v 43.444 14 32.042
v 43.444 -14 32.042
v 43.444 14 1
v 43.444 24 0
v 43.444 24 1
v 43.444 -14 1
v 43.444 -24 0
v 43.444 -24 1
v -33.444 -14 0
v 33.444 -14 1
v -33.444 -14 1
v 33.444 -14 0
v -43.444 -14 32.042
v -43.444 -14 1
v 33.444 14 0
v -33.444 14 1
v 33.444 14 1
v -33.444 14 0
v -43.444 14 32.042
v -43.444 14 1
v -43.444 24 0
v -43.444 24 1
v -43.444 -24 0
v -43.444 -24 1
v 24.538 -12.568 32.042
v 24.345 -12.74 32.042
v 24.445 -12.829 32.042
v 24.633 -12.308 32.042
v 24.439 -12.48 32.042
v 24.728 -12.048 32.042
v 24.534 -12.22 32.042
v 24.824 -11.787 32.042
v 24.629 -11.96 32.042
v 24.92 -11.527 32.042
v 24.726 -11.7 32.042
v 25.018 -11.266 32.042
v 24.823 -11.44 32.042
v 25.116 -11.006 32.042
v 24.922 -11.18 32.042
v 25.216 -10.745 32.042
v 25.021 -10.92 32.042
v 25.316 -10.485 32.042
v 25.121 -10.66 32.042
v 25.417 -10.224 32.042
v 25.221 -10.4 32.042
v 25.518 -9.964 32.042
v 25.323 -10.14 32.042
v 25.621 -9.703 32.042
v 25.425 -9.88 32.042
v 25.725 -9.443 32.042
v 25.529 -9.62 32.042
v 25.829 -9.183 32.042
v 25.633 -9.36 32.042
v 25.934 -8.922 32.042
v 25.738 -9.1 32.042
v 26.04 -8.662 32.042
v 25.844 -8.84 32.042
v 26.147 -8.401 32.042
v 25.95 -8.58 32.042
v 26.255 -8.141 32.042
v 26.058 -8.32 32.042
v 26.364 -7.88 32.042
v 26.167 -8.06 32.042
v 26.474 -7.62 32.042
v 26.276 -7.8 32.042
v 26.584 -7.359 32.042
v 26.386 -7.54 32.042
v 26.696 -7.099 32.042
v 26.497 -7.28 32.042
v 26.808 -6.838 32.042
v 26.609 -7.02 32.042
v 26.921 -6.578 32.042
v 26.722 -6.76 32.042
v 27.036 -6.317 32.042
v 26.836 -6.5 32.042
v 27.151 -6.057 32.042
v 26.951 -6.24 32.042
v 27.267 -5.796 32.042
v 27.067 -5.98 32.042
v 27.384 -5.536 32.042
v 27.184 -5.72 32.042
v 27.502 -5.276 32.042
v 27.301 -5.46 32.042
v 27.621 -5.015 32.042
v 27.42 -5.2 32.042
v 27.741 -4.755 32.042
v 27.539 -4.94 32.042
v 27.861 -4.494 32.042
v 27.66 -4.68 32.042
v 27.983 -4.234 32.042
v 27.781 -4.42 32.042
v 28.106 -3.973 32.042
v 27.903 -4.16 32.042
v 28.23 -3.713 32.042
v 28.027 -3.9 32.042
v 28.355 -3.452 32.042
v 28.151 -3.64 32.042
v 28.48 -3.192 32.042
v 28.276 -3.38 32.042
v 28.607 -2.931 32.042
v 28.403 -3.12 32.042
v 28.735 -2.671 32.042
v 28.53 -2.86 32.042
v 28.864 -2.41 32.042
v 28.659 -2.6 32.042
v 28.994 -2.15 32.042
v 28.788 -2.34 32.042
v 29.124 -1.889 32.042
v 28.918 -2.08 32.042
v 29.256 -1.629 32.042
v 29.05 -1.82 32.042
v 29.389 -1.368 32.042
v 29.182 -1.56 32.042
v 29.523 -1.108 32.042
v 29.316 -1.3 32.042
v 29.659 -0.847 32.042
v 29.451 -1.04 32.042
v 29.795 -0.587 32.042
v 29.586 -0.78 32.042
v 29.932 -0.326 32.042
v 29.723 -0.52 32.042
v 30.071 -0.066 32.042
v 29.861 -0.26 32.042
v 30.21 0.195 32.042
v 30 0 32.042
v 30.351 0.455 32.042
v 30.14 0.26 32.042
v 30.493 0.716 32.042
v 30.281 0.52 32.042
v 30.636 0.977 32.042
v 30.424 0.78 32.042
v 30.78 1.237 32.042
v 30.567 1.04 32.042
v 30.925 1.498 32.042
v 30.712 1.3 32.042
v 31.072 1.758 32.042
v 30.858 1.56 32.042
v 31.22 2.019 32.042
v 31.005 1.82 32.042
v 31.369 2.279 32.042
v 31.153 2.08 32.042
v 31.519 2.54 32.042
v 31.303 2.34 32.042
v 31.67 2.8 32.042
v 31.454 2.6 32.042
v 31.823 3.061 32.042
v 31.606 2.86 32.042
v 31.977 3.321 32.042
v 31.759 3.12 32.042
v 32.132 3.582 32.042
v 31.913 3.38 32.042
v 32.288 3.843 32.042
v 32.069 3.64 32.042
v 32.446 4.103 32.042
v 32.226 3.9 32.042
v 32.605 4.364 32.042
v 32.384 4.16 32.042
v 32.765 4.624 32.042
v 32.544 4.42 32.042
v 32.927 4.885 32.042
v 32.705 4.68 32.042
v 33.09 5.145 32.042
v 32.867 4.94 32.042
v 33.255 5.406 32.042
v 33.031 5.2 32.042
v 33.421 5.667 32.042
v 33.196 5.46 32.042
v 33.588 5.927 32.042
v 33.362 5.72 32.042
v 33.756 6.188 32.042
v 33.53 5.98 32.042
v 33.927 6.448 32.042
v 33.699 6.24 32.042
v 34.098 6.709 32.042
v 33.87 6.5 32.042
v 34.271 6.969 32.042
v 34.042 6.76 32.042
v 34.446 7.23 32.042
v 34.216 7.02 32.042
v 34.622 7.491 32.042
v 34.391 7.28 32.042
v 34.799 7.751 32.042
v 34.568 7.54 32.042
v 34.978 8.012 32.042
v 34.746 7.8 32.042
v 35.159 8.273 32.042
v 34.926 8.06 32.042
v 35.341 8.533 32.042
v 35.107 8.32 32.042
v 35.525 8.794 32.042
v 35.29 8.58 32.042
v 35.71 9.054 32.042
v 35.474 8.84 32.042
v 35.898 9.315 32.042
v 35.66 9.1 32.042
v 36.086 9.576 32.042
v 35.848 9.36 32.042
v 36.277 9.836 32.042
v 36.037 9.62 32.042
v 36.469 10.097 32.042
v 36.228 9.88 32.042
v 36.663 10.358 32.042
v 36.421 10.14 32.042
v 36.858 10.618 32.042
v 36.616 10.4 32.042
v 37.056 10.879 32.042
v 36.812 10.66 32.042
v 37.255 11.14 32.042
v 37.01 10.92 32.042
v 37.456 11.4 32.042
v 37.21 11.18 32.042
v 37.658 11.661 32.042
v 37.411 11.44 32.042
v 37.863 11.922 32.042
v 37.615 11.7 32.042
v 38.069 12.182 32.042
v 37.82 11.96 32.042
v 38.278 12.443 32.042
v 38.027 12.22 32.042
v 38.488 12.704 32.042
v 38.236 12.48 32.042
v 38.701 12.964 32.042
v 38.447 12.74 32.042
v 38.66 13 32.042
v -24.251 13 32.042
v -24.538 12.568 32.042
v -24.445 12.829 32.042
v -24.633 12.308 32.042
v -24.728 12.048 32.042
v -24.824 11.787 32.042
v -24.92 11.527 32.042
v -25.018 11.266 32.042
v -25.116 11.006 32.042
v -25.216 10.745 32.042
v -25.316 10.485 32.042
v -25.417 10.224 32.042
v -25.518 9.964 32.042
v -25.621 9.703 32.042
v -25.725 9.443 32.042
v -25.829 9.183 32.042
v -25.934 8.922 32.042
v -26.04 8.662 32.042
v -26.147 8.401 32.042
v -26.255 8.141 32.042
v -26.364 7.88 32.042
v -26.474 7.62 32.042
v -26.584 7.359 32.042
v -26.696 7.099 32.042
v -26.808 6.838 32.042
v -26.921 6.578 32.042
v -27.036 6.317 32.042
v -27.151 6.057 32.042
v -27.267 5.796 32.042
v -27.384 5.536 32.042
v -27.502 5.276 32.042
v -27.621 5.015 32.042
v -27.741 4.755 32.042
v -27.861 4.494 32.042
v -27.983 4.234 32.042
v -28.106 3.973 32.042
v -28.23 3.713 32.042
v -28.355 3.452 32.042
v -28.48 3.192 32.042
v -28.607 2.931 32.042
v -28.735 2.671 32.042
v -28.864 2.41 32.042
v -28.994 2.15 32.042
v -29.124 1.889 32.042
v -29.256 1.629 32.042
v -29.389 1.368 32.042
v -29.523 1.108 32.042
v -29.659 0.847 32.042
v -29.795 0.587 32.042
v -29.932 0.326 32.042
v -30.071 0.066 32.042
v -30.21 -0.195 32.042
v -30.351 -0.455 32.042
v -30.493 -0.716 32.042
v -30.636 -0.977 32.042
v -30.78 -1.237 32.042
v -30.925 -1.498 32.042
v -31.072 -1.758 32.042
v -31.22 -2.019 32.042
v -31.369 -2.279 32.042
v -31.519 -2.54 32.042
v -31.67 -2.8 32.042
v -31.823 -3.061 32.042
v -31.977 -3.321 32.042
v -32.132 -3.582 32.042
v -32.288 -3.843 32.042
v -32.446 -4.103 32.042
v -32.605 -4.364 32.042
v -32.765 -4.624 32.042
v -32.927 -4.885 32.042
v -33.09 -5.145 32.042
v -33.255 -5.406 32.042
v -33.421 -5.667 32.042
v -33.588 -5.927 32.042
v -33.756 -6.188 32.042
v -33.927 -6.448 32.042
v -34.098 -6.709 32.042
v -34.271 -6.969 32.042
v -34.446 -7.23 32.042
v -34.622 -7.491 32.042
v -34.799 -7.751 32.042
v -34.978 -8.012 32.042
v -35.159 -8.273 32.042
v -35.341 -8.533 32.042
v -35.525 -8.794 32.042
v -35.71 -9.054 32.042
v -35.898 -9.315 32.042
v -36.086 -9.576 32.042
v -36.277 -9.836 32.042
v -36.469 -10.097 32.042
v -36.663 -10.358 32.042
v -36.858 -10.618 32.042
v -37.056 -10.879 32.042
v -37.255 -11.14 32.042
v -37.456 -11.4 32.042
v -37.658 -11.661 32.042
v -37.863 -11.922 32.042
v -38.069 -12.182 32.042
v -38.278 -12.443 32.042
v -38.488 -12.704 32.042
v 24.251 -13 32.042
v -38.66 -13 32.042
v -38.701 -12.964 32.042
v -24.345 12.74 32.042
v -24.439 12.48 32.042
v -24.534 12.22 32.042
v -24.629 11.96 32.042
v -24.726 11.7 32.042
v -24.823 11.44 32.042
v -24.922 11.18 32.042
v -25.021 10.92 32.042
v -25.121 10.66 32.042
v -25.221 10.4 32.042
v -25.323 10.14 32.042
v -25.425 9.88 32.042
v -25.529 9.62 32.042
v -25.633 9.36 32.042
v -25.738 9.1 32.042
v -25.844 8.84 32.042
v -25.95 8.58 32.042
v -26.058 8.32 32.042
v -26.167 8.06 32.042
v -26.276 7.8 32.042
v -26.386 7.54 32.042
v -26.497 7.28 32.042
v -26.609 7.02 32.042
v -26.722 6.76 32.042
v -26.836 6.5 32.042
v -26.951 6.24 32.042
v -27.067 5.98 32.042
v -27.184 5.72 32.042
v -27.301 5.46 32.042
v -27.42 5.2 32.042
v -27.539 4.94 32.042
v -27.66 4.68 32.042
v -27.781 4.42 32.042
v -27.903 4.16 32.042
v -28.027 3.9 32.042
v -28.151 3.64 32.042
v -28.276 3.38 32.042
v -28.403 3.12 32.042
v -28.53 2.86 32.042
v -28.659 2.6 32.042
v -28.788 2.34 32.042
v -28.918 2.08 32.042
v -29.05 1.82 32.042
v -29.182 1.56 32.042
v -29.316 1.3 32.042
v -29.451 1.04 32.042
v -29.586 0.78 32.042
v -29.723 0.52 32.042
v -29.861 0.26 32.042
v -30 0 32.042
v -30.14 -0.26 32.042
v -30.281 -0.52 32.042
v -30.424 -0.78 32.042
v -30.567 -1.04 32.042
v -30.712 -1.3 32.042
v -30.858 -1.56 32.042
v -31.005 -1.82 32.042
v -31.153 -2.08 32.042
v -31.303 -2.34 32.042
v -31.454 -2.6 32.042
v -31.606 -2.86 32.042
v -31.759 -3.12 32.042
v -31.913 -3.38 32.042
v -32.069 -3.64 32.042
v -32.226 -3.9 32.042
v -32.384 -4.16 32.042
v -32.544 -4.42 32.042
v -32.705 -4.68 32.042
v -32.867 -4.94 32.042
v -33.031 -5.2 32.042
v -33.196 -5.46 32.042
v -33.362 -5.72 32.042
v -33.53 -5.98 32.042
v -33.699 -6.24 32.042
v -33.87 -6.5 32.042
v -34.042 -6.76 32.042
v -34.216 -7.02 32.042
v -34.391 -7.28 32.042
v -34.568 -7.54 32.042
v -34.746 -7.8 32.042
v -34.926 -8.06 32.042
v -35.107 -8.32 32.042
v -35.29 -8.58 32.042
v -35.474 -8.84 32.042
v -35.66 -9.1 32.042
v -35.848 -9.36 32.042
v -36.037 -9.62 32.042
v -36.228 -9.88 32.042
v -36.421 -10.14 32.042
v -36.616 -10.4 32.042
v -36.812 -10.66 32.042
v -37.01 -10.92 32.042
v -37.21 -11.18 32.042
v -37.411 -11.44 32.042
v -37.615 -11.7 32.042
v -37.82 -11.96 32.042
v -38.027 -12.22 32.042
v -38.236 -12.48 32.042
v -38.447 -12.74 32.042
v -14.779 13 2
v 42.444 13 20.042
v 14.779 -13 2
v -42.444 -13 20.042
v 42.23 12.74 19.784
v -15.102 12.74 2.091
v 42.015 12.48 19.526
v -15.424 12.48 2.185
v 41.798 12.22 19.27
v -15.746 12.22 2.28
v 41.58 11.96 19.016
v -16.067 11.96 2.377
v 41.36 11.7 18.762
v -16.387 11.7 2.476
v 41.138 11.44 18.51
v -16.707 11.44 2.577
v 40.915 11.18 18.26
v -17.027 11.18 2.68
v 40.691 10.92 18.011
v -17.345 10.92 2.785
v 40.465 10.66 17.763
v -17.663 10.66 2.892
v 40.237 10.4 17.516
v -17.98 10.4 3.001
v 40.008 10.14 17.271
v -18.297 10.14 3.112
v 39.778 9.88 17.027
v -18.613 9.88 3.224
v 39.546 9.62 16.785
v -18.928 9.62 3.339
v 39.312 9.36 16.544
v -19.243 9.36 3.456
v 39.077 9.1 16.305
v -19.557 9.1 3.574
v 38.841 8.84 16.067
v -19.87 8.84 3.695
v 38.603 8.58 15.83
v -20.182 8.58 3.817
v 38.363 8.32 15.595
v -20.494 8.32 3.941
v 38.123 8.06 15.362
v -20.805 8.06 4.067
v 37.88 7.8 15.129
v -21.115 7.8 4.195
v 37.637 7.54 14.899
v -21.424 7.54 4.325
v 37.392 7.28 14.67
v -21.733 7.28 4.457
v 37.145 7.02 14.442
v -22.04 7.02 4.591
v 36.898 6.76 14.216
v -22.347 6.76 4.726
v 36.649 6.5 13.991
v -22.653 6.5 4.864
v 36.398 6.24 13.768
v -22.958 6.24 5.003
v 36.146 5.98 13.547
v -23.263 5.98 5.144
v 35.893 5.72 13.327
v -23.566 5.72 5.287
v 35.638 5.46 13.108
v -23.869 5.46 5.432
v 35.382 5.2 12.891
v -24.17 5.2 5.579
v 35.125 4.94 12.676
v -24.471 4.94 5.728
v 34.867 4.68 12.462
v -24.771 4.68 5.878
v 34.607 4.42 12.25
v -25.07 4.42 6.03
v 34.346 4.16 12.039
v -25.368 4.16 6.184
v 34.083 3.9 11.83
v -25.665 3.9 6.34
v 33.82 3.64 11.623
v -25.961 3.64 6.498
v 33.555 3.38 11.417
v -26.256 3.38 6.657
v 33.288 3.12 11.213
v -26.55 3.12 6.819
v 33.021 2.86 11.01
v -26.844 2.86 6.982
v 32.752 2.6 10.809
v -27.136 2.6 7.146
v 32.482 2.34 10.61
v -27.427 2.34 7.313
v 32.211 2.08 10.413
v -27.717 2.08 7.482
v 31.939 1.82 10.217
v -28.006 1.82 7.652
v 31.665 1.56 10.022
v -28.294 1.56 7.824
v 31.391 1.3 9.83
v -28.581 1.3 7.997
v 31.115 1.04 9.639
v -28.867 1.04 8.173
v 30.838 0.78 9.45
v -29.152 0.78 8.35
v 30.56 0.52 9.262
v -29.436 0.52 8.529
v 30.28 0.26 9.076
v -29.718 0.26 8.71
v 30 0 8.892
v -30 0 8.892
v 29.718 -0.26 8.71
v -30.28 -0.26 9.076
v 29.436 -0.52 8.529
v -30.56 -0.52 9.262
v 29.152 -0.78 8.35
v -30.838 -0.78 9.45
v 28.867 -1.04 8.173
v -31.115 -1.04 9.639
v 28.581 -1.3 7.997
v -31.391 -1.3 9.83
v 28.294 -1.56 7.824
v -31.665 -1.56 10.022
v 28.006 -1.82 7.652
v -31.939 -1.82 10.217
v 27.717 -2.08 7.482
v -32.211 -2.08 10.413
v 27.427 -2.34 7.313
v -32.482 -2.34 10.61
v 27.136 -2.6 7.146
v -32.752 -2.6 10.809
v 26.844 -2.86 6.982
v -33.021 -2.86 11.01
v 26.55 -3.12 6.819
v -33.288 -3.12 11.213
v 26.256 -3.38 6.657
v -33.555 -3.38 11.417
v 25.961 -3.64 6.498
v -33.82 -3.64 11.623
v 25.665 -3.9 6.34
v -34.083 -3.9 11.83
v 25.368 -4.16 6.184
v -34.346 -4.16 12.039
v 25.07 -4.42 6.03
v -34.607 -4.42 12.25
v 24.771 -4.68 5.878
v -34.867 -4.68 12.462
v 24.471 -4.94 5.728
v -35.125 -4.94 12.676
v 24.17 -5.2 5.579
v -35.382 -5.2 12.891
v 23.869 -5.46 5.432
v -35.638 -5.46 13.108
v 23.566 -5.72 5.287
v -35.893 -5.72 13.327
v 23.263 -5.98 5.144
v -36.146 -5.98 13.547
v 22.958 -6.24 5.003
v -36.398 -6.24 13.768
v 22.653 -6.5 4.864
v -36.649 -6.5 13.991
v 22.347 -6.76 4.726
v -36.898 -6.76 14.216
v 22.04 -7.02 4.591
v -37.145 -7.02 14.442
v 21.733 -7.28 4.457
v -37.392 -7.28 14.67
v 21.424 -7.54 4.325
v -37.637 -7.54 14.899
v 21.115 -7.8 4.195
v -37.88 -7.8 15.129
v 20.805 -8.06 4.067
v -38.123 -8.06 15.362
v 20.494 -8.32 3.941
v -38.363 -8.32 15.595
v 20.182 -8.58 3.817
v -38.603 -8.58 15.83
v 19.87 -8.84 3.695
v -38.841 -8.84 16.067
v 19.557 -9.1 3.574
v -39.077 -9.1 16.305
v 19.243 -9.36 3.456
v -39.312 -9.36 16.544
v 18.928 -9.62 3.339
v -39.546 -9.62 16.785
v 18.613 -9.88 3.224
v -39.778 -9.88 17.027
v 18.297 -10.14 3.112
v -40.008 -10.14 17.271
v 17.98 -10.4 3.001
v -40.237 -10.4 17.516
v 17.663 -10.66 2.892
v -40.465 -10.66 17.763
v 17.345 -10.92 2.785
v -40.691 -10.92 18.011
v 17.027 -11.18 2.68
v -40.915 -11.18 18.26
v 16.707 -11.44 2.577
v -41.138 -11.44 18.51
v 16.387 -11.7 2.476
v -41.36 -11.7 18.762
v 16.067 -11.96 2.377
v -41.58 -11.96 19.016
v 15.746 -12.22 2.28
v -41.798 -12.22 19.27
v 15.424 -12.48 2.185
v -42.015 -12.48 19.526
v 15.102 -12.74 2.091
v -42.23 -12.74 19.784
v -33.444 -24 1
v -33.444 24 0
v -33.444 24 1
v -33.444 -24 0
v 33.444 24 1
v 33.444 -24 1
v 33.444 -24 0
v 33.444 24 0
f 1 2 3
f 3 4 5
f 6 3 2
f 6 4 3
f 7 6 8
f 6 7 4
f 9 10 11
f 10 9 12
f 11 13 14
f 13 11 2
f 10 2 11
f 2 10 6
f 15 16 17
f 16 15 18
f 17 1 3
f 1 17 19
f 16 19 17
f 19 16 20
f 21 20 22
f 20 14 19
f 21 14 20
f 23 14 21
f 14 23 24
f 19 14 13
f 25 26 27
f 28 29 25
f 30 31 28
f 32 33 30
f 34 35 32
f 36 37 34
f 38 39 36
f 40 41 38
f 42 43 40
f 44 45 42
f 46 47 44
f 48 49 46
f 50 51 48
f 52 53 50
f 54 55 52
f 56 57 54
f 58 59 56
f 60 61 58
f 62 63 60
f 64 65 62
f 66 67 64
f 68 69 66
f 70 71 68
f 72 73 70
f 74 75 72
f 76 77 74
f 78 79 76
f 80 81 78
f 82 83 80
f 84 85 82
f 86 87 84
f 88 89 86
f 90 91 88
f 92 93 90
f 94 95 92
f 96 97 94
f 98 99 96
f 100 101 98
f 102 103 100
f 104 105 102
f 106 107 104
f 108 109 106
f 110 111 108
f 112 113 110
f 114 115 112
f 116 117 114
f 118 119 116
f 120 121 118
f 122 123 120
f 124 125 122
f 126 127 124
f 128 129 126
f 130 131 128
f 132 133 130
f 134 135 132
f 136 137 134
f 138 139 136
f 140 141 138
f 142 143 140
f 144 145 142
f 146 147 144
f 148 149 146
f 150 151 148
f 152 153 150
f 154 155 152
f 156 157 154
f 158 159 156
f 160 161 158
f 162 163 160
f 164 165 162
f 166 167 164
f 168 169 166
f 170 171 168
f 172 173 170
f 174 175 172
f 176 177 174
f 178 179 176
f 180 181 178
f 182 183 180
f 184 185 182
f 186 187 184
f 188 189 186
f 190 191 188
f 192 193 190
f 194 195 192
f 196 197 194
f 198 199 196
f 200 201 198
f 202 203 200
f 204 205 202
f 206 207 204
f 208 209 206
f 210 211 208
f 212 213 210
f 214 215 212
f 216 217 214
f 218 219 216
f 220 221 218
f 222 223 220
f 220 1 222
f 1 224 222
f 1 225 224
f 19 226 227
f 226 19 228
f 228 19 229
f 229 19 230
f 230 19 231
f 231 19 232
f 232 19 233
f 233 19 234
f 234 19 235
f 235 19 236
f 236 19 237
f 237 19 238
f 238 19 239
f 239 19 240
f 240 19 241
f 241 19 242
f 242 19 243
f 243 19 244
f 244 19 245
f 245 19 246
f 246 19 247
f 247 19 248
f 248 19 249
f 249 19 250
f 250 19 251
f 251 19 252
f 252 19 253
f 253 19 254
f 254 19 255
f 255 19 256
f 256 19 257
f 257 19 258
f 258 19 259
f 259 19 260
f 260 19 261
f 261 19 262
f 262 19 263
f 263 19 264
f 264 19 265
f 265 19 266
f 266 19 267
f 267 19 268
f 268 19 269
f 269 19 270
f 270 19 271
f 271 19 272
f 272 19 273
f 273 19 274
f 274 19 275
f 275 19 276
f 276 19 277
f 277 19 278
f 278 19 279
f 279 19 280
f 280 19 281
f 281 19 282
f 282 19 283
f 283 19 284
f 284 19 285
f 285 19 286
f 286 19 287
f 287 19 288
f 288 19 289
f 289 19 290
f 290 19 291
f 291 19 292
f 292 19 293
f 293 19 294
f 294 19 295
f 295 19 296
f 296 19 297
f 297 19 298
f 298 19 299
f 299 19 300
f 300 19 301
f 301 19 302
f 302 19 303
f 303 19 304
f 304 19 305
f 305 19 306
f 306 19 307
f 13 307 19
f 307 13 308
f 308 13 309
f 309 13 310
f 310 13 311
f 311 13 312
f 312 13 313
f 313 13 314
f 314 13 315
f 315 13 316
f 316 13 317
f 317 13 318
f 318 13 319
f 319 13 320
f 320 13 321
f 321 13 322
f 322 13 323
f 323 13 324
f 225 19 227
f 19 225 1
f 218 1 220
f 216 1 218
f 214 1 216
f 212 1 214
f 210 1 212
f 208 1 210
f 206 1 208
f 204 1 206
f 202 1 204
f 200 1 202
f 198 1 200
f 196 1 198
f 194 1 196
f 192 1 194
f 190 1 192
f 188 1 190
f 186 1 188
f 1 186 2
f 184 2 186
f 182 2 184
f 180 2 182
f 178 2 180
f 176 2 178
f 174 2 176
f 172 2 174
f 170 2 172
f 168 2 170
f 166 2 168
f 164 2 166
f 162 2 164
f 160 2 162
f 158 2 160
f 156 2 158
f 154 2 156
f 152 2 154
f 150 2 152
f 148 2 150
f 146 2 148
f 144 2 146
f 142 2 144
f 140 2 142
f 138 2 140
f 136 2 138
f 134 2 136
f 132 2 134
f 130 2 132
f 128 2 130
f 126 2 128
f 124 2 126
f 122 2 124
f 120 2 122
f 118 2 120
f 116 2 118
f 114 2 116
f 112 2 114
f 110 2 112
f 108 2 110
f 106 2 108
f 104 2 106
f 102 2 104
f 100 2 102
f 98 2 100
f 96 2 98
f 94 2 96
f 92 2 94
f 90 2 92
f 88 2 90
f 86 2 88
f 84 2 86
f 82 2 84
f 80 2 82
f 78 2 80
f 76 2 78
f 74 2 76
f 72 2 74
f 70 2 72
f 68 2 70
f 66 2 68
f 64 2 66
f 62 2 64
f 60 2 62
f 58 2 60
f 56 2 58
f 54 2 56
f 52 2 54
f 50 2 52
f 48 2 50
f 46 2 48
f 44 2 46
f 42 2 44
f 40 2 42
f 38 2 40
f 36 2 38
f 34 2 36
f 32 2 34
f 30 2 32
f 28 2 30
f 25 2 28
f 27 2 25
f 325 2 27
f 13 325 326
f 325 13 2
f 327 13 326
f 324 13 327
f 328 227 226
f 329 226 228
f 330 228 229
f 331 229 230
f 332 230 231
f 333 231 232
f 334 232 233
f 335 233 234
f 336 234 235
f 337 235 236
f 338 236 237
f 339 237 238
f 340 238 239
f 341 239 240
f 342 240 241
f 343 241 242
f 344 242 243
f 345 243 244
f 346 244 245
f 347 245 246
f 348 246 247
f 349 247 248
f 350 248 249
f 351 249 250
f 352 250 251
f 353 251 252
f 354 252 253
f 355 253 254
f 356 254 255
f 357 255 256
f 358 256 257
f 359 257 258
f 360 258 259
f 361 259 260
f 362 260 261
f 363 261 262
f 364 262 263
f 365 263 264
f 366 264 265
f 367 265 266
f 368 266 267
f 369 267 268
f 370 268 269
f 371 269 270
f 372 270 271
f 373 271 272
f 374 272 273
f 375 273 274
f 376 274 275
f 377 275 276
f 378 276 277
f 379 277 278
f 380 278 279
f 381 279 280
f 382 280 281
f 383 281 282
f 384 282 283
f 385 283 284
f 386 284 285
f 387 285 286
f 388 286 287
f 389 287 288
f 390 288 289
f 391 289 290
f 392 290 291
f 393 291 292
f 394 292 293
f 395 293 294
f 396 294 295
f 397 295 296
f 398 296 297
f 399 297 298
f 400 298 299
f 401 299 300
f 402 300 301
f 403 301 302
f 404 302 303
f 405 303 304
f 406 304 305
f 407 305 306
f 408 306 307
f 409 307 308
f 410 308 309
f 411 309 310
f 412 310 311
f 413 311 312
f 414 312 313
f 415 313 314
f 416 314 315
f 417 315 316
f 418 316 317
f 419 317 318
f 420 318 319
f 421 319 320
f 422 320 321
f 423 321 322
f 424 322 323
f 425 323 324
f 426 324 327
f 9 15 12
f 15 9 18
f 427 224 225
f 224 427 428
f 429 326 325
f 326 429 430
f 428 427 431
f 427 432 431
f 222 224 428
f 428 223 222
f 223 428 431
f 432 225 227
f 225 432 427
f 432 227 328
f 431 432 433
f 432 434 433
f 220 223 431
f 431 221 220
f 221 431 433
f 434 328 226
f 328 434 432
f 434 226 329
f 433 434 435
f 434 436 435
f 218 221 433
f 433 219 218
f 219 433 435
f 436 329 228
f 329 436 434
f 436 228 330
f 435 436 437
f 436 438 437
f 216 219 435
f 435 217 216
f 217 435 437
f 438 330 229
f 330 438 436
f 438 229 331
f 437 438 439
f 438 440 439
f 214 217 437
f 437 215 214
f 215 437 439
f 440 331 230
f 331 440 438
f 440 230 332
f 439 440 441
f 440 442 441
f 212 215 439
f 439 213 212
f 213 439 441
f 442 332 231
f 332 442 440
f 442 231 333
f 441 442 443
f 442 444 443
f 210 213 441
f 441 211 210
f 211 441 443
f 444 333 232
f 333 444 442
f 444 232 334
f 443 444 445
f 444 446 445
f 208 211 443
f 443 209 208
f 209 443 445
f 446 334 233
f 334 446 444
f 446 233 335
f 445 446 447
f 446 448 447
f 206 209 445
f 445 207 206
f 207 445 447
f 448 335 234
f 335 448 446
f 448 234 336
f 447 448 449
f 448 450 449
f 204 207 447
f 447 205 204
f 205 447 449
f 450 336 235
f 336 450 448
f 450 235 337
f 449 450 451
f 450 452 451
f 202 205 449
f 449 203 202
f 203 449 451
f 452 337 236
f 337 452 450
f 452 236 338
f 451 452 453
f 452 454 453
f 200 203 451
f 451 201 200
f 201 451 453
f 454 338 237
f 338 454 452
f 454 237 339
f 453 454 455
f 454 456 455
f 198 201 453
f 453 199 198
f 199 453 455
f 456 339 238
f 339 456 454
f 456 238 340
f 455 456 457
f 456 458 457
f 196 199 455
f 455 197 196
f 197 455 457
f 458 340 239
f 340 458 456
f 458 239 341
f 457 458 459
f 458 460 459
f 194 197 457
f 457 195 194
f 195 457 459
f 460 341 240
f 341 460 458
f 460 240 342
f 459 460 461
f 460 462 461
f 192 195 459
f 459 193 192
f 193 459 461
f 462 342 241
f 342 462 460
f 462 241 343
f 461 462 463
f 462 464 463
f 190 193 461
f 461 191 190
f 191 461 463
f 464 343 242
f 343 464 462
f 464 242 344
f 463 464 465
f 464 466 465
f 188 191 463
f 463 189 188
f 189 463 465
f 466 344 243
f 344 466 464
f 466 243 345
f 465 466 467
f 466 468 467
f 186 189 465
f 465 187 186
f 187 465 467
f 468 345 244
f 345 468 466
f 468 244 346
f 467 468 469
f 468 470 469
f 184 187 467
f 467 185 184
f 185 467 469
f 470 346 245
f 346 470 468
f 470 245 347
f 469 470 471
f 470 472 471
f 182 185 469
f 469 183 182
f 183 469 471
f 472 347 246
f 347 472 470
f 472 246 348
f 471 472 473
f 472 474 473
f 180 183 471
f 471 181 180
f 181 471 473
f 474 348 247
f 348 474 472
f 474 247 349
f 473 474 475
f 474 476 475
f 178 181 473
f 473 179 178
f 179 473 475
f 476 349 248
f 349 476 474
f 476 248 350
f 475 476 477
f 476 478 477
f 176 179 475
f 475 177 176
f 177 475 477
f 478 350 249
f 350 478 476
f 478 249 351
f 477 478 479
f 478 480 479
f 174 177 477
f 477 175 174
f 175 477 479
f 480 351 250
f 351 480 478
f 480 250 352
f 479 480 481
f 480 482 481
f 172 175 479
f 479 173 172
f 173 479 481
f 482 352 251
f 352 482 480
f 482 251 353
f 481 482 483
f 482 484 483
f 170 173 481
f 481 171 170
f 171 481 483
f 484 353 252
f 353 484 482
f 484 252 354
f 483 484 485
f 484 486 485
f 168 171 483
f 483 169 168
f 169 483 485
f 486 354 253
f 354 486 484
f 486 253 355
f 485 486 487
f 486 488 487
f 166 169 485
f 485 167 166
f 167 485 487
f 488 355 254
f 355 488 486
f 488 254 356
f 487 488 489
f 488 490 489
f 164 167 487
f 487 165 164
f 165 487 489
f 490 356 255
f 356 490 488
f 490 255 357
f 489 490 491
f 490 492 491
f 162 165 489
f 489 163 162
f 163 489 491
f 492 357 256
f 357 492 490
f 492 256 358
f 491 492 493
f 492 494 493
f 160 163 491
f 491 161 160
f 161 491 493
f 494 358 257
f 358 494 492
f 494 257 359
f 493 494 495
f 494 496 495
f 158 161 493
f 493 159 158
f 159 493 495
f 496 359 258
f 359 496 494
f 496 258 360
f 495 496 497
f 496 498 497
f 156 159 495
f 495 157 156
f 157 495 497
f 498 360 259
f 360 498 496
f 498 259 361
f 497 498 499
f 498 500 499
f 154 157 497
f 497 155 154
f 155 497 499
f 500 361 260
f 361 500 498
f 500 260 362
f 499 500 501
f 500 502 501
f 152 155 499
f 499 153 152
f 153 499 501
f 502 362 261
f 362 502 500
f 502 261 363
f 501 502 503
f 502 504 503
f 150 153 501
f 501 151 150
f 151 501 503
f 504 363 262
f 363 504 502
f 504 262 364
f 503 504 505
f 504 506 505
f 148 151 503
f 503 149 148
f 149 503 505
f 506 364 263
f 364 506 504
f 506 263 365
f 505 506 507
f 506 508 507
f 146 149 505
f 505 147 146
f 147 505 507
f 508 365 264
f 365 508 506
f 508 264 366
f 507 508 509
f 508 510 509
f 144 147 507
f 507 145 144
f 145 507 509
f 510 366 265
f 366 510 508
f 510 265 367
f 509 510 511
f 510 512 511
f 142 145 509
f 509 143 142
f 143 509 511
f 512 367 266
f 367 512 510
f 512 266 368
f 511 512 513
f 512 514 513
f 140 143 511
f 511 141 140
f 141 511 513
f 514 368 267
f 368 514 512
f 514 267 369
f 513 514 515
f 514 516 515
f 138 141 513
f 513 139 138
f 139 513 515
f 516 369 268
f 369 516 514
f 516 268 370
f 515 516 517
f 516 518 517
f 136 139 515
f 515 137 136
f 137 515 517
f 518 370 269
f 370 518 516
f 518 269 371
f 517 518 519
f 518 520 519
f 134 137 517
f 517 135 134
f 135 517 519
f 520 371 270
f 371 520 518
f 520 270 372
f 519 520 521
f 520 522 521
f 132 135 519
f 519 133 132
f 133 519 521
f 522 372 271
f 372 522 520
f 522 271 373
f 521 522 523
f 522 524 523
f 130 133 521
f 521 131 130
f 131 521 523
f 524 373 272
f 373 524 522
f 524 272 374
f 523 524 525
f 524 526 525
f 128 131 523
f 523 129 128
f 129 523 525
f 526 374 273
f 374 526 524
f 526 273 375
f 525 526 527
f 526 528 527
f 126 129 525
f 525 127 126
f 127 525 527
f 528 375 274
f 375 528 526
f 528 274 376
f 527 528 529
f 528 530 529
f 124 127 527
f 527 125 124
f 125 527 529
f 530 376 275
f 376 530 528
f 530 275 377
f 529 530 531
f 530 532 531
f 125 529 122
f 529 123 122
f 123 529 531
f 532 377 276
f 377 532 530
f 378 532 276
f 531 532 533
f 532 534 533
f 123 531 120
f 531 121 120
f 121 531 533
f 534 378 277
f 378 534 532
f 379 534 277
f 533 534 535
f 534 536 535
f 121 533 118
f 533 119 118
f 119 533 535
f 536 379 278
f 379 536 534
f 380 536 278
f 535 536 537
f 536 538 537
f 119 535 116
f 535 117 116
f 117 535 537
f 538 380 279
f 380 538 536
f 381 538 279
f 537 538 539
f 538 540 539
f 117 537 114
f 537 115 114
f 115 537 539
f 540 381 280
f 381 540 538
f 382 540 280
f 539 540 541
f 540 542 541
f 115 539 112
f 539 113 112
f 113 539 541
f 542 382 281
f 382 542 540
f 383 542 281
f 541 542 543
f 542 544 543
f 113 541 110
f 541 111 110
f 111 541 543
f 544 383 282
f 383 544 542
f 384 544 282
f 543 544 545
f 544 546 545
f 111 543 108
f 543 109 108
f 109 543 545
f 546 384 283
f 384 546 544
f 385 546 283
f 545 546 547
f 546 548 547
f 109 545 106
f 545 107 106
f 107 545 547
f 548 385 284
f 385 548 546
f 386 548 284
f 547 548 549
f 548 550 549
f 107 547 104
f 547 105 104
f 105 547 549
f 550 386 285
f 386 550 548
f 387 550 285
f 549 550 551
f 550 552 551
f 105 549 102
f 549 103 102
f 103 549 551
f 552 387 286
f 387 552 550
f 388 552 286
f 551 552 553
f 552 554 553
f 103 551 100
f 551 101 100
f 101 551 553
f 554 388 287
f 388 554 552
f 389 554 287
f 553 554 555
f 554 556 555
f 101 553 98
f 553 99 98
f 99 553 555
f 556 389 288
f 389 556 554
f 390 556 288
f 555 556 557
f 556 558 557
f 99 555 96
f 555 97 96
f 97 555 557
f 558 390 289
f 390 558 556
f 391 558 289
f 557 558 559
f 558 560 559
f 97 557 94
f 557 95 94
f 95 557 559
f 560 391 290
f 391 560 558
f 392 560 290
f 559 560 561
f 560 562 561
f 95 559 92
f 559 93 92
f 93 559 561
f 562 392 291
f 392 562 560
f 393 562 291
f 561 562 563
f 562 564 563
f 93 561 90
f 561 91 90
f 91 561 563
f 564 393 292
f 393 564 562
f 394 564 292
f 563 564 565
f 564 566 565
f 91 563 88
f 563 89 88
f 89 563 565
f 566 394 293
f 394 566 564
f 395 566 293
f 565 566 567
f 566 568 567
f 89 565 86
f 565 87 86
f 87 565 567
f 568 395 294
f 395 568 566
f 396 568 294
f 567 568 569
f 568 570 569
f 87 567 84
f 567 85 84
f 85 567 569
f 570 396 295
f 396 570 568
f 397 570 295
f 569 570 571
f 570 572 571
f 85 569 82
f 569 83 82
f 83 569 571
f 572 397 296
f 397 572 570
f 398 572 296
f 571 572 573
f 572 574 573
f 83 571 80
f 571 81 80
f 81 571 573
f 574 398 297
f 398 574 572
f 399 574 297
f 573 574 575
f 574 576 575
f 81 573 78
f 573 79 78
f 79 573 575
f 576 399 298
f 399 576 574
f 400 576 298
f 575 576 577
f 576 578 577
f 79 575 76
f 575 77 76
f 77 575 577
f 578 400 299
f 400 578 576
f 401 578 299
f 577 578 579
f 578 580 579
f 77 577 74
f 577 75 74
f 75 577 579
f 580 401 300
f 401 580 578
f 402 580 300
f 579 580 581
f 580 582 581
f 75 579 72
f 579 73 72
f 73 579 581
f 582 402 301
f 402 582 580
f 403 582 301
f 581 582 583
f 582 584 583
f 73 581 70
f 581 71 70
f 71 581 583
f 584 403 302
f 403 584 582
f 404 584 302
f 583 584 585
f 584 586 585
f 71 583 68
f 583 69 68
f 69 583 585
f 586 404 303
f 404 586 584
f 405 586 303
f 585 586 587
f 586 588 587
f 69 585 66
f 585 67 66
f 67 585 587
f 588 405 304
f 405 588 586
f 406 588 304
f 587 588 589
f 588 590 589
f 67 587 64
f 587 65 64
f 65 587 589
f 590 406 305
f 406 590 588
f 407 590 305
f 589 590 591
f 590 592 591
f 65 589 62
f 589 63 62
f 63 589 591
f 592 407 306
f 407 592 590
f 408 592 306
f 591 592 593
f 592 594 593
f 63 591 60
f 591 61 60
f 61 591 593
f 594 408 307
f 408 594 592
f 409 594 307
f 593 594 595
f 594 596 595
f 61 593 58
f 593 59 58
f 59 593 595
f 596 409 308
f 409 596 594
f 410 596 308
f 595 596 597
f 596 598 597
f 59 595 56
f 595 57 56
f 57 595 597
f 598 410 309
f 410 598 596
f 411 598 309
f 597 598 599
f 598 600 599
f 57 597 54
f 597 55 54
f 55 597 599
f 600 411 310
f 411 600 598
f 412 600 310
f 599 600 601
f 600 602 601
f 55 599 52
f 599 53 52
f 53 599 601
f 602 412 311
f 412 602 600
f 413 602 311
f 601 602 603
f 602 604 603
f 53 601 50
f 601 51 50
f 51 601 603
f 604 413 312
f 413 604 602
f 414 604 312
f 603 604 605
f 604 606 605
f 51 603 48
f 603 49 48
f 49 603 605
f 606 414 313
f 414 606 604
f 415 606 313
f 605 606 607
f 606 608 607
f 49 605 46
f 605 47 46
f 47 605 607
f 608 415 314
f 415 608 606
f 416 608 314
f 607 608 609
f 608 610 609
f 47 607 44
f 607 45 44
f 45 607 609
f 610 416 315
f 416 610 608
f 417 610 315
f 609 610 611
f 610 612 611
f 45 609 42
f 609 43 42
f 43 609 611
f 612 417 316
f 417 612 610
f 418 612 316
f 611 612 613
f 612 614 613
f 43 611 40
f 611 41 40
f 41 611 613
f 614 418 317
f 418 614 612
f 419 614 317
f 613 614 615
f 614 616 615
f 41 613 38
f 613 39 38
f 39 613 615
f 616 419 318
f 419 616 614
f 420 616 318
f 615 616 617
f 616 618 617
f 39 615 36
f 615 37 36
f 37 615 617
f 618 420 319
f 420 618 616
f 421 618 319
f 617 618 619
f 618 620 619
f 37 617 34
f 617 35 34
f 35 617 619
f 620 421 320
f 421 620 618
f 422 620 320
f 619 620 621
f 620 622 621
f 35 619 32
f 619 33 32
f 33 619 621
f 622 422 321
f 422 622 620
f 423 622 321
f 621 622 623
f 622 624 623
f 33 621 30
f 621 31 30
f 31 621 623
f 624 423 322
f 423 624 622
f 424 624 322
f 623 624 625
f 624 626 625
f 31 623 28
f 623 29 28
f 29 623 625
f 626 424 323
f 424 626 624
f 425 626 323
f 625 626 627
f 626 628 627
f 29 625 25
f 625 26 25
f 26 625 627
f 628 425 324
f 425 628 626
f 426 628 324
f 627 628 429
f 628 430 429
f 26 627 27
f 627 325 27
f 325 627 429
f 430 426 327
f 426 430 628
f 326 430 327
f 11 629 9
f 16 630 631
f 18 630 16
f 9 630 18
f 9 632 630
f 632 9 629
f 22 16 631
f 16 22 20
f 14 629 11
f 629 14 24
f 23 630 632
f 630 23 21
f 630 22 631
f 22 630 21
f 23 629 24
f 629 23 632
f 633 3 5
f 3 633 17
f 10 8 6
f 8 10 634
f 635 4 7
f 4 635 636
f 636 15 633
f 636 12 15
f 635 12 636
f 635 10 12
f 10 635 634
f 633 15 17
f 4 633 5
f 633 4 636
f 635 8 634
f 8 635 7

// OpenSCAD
// of cards
number = 52;

feetSize = 10;
feetWidth = 10;

// of card
height = 92;

// of card
width = 60;

// angle
fan = 35;

// beyond necessity
boxExtension = 10;

module cardHolder() {
    translate([0,0,fannedHeight/2])
    rotate([90,0,0])
    difference() {
        translate ([-(fannedWidth+2)/2,-fannedHeight/2,-(number/2+2)/2])
        cube ([fannedWidth+2,box,number/2+2]);
        translate([0,2,0])
        linear_extrude(center=true, height=number/2 ,twist=fan, slices=100)
        rotate([0,0,fan/2])
        square ([width,height],center=true);
    }
    translate([-(fannedWidth+2)/2,-(number/2+2+feetSize*2)/2,0])
    cube([feetWidth,number/2+2+feetSize*2,1]);
    translate([(fannedWidth+2)/2-feetWidth,-(number/2+2+feetSize*2)/2,0])
    cube([feetWidth,number/2+2+feetSize*2,1]);
}

module cards() {
    translate([0,0,fannedHeight/2])
    rotate([90,0,0])
    translate([0,2,0])
    linear_extrude(center=true, height=number/2 ,twist=fan, slices=100)
    rotate([0,0,fan/2])
    square ([width,height],center=true);
    
}
$fn=90;

// ; height
box = (width*sin(fan/2)+4)+boxExtension;
fannedWidth = width*cos(fan/2)+height*sin(fan/2);
fannedHeight = width*sin(fan/2)+height*cos(fan/2);

cardHolder();
%cards();
